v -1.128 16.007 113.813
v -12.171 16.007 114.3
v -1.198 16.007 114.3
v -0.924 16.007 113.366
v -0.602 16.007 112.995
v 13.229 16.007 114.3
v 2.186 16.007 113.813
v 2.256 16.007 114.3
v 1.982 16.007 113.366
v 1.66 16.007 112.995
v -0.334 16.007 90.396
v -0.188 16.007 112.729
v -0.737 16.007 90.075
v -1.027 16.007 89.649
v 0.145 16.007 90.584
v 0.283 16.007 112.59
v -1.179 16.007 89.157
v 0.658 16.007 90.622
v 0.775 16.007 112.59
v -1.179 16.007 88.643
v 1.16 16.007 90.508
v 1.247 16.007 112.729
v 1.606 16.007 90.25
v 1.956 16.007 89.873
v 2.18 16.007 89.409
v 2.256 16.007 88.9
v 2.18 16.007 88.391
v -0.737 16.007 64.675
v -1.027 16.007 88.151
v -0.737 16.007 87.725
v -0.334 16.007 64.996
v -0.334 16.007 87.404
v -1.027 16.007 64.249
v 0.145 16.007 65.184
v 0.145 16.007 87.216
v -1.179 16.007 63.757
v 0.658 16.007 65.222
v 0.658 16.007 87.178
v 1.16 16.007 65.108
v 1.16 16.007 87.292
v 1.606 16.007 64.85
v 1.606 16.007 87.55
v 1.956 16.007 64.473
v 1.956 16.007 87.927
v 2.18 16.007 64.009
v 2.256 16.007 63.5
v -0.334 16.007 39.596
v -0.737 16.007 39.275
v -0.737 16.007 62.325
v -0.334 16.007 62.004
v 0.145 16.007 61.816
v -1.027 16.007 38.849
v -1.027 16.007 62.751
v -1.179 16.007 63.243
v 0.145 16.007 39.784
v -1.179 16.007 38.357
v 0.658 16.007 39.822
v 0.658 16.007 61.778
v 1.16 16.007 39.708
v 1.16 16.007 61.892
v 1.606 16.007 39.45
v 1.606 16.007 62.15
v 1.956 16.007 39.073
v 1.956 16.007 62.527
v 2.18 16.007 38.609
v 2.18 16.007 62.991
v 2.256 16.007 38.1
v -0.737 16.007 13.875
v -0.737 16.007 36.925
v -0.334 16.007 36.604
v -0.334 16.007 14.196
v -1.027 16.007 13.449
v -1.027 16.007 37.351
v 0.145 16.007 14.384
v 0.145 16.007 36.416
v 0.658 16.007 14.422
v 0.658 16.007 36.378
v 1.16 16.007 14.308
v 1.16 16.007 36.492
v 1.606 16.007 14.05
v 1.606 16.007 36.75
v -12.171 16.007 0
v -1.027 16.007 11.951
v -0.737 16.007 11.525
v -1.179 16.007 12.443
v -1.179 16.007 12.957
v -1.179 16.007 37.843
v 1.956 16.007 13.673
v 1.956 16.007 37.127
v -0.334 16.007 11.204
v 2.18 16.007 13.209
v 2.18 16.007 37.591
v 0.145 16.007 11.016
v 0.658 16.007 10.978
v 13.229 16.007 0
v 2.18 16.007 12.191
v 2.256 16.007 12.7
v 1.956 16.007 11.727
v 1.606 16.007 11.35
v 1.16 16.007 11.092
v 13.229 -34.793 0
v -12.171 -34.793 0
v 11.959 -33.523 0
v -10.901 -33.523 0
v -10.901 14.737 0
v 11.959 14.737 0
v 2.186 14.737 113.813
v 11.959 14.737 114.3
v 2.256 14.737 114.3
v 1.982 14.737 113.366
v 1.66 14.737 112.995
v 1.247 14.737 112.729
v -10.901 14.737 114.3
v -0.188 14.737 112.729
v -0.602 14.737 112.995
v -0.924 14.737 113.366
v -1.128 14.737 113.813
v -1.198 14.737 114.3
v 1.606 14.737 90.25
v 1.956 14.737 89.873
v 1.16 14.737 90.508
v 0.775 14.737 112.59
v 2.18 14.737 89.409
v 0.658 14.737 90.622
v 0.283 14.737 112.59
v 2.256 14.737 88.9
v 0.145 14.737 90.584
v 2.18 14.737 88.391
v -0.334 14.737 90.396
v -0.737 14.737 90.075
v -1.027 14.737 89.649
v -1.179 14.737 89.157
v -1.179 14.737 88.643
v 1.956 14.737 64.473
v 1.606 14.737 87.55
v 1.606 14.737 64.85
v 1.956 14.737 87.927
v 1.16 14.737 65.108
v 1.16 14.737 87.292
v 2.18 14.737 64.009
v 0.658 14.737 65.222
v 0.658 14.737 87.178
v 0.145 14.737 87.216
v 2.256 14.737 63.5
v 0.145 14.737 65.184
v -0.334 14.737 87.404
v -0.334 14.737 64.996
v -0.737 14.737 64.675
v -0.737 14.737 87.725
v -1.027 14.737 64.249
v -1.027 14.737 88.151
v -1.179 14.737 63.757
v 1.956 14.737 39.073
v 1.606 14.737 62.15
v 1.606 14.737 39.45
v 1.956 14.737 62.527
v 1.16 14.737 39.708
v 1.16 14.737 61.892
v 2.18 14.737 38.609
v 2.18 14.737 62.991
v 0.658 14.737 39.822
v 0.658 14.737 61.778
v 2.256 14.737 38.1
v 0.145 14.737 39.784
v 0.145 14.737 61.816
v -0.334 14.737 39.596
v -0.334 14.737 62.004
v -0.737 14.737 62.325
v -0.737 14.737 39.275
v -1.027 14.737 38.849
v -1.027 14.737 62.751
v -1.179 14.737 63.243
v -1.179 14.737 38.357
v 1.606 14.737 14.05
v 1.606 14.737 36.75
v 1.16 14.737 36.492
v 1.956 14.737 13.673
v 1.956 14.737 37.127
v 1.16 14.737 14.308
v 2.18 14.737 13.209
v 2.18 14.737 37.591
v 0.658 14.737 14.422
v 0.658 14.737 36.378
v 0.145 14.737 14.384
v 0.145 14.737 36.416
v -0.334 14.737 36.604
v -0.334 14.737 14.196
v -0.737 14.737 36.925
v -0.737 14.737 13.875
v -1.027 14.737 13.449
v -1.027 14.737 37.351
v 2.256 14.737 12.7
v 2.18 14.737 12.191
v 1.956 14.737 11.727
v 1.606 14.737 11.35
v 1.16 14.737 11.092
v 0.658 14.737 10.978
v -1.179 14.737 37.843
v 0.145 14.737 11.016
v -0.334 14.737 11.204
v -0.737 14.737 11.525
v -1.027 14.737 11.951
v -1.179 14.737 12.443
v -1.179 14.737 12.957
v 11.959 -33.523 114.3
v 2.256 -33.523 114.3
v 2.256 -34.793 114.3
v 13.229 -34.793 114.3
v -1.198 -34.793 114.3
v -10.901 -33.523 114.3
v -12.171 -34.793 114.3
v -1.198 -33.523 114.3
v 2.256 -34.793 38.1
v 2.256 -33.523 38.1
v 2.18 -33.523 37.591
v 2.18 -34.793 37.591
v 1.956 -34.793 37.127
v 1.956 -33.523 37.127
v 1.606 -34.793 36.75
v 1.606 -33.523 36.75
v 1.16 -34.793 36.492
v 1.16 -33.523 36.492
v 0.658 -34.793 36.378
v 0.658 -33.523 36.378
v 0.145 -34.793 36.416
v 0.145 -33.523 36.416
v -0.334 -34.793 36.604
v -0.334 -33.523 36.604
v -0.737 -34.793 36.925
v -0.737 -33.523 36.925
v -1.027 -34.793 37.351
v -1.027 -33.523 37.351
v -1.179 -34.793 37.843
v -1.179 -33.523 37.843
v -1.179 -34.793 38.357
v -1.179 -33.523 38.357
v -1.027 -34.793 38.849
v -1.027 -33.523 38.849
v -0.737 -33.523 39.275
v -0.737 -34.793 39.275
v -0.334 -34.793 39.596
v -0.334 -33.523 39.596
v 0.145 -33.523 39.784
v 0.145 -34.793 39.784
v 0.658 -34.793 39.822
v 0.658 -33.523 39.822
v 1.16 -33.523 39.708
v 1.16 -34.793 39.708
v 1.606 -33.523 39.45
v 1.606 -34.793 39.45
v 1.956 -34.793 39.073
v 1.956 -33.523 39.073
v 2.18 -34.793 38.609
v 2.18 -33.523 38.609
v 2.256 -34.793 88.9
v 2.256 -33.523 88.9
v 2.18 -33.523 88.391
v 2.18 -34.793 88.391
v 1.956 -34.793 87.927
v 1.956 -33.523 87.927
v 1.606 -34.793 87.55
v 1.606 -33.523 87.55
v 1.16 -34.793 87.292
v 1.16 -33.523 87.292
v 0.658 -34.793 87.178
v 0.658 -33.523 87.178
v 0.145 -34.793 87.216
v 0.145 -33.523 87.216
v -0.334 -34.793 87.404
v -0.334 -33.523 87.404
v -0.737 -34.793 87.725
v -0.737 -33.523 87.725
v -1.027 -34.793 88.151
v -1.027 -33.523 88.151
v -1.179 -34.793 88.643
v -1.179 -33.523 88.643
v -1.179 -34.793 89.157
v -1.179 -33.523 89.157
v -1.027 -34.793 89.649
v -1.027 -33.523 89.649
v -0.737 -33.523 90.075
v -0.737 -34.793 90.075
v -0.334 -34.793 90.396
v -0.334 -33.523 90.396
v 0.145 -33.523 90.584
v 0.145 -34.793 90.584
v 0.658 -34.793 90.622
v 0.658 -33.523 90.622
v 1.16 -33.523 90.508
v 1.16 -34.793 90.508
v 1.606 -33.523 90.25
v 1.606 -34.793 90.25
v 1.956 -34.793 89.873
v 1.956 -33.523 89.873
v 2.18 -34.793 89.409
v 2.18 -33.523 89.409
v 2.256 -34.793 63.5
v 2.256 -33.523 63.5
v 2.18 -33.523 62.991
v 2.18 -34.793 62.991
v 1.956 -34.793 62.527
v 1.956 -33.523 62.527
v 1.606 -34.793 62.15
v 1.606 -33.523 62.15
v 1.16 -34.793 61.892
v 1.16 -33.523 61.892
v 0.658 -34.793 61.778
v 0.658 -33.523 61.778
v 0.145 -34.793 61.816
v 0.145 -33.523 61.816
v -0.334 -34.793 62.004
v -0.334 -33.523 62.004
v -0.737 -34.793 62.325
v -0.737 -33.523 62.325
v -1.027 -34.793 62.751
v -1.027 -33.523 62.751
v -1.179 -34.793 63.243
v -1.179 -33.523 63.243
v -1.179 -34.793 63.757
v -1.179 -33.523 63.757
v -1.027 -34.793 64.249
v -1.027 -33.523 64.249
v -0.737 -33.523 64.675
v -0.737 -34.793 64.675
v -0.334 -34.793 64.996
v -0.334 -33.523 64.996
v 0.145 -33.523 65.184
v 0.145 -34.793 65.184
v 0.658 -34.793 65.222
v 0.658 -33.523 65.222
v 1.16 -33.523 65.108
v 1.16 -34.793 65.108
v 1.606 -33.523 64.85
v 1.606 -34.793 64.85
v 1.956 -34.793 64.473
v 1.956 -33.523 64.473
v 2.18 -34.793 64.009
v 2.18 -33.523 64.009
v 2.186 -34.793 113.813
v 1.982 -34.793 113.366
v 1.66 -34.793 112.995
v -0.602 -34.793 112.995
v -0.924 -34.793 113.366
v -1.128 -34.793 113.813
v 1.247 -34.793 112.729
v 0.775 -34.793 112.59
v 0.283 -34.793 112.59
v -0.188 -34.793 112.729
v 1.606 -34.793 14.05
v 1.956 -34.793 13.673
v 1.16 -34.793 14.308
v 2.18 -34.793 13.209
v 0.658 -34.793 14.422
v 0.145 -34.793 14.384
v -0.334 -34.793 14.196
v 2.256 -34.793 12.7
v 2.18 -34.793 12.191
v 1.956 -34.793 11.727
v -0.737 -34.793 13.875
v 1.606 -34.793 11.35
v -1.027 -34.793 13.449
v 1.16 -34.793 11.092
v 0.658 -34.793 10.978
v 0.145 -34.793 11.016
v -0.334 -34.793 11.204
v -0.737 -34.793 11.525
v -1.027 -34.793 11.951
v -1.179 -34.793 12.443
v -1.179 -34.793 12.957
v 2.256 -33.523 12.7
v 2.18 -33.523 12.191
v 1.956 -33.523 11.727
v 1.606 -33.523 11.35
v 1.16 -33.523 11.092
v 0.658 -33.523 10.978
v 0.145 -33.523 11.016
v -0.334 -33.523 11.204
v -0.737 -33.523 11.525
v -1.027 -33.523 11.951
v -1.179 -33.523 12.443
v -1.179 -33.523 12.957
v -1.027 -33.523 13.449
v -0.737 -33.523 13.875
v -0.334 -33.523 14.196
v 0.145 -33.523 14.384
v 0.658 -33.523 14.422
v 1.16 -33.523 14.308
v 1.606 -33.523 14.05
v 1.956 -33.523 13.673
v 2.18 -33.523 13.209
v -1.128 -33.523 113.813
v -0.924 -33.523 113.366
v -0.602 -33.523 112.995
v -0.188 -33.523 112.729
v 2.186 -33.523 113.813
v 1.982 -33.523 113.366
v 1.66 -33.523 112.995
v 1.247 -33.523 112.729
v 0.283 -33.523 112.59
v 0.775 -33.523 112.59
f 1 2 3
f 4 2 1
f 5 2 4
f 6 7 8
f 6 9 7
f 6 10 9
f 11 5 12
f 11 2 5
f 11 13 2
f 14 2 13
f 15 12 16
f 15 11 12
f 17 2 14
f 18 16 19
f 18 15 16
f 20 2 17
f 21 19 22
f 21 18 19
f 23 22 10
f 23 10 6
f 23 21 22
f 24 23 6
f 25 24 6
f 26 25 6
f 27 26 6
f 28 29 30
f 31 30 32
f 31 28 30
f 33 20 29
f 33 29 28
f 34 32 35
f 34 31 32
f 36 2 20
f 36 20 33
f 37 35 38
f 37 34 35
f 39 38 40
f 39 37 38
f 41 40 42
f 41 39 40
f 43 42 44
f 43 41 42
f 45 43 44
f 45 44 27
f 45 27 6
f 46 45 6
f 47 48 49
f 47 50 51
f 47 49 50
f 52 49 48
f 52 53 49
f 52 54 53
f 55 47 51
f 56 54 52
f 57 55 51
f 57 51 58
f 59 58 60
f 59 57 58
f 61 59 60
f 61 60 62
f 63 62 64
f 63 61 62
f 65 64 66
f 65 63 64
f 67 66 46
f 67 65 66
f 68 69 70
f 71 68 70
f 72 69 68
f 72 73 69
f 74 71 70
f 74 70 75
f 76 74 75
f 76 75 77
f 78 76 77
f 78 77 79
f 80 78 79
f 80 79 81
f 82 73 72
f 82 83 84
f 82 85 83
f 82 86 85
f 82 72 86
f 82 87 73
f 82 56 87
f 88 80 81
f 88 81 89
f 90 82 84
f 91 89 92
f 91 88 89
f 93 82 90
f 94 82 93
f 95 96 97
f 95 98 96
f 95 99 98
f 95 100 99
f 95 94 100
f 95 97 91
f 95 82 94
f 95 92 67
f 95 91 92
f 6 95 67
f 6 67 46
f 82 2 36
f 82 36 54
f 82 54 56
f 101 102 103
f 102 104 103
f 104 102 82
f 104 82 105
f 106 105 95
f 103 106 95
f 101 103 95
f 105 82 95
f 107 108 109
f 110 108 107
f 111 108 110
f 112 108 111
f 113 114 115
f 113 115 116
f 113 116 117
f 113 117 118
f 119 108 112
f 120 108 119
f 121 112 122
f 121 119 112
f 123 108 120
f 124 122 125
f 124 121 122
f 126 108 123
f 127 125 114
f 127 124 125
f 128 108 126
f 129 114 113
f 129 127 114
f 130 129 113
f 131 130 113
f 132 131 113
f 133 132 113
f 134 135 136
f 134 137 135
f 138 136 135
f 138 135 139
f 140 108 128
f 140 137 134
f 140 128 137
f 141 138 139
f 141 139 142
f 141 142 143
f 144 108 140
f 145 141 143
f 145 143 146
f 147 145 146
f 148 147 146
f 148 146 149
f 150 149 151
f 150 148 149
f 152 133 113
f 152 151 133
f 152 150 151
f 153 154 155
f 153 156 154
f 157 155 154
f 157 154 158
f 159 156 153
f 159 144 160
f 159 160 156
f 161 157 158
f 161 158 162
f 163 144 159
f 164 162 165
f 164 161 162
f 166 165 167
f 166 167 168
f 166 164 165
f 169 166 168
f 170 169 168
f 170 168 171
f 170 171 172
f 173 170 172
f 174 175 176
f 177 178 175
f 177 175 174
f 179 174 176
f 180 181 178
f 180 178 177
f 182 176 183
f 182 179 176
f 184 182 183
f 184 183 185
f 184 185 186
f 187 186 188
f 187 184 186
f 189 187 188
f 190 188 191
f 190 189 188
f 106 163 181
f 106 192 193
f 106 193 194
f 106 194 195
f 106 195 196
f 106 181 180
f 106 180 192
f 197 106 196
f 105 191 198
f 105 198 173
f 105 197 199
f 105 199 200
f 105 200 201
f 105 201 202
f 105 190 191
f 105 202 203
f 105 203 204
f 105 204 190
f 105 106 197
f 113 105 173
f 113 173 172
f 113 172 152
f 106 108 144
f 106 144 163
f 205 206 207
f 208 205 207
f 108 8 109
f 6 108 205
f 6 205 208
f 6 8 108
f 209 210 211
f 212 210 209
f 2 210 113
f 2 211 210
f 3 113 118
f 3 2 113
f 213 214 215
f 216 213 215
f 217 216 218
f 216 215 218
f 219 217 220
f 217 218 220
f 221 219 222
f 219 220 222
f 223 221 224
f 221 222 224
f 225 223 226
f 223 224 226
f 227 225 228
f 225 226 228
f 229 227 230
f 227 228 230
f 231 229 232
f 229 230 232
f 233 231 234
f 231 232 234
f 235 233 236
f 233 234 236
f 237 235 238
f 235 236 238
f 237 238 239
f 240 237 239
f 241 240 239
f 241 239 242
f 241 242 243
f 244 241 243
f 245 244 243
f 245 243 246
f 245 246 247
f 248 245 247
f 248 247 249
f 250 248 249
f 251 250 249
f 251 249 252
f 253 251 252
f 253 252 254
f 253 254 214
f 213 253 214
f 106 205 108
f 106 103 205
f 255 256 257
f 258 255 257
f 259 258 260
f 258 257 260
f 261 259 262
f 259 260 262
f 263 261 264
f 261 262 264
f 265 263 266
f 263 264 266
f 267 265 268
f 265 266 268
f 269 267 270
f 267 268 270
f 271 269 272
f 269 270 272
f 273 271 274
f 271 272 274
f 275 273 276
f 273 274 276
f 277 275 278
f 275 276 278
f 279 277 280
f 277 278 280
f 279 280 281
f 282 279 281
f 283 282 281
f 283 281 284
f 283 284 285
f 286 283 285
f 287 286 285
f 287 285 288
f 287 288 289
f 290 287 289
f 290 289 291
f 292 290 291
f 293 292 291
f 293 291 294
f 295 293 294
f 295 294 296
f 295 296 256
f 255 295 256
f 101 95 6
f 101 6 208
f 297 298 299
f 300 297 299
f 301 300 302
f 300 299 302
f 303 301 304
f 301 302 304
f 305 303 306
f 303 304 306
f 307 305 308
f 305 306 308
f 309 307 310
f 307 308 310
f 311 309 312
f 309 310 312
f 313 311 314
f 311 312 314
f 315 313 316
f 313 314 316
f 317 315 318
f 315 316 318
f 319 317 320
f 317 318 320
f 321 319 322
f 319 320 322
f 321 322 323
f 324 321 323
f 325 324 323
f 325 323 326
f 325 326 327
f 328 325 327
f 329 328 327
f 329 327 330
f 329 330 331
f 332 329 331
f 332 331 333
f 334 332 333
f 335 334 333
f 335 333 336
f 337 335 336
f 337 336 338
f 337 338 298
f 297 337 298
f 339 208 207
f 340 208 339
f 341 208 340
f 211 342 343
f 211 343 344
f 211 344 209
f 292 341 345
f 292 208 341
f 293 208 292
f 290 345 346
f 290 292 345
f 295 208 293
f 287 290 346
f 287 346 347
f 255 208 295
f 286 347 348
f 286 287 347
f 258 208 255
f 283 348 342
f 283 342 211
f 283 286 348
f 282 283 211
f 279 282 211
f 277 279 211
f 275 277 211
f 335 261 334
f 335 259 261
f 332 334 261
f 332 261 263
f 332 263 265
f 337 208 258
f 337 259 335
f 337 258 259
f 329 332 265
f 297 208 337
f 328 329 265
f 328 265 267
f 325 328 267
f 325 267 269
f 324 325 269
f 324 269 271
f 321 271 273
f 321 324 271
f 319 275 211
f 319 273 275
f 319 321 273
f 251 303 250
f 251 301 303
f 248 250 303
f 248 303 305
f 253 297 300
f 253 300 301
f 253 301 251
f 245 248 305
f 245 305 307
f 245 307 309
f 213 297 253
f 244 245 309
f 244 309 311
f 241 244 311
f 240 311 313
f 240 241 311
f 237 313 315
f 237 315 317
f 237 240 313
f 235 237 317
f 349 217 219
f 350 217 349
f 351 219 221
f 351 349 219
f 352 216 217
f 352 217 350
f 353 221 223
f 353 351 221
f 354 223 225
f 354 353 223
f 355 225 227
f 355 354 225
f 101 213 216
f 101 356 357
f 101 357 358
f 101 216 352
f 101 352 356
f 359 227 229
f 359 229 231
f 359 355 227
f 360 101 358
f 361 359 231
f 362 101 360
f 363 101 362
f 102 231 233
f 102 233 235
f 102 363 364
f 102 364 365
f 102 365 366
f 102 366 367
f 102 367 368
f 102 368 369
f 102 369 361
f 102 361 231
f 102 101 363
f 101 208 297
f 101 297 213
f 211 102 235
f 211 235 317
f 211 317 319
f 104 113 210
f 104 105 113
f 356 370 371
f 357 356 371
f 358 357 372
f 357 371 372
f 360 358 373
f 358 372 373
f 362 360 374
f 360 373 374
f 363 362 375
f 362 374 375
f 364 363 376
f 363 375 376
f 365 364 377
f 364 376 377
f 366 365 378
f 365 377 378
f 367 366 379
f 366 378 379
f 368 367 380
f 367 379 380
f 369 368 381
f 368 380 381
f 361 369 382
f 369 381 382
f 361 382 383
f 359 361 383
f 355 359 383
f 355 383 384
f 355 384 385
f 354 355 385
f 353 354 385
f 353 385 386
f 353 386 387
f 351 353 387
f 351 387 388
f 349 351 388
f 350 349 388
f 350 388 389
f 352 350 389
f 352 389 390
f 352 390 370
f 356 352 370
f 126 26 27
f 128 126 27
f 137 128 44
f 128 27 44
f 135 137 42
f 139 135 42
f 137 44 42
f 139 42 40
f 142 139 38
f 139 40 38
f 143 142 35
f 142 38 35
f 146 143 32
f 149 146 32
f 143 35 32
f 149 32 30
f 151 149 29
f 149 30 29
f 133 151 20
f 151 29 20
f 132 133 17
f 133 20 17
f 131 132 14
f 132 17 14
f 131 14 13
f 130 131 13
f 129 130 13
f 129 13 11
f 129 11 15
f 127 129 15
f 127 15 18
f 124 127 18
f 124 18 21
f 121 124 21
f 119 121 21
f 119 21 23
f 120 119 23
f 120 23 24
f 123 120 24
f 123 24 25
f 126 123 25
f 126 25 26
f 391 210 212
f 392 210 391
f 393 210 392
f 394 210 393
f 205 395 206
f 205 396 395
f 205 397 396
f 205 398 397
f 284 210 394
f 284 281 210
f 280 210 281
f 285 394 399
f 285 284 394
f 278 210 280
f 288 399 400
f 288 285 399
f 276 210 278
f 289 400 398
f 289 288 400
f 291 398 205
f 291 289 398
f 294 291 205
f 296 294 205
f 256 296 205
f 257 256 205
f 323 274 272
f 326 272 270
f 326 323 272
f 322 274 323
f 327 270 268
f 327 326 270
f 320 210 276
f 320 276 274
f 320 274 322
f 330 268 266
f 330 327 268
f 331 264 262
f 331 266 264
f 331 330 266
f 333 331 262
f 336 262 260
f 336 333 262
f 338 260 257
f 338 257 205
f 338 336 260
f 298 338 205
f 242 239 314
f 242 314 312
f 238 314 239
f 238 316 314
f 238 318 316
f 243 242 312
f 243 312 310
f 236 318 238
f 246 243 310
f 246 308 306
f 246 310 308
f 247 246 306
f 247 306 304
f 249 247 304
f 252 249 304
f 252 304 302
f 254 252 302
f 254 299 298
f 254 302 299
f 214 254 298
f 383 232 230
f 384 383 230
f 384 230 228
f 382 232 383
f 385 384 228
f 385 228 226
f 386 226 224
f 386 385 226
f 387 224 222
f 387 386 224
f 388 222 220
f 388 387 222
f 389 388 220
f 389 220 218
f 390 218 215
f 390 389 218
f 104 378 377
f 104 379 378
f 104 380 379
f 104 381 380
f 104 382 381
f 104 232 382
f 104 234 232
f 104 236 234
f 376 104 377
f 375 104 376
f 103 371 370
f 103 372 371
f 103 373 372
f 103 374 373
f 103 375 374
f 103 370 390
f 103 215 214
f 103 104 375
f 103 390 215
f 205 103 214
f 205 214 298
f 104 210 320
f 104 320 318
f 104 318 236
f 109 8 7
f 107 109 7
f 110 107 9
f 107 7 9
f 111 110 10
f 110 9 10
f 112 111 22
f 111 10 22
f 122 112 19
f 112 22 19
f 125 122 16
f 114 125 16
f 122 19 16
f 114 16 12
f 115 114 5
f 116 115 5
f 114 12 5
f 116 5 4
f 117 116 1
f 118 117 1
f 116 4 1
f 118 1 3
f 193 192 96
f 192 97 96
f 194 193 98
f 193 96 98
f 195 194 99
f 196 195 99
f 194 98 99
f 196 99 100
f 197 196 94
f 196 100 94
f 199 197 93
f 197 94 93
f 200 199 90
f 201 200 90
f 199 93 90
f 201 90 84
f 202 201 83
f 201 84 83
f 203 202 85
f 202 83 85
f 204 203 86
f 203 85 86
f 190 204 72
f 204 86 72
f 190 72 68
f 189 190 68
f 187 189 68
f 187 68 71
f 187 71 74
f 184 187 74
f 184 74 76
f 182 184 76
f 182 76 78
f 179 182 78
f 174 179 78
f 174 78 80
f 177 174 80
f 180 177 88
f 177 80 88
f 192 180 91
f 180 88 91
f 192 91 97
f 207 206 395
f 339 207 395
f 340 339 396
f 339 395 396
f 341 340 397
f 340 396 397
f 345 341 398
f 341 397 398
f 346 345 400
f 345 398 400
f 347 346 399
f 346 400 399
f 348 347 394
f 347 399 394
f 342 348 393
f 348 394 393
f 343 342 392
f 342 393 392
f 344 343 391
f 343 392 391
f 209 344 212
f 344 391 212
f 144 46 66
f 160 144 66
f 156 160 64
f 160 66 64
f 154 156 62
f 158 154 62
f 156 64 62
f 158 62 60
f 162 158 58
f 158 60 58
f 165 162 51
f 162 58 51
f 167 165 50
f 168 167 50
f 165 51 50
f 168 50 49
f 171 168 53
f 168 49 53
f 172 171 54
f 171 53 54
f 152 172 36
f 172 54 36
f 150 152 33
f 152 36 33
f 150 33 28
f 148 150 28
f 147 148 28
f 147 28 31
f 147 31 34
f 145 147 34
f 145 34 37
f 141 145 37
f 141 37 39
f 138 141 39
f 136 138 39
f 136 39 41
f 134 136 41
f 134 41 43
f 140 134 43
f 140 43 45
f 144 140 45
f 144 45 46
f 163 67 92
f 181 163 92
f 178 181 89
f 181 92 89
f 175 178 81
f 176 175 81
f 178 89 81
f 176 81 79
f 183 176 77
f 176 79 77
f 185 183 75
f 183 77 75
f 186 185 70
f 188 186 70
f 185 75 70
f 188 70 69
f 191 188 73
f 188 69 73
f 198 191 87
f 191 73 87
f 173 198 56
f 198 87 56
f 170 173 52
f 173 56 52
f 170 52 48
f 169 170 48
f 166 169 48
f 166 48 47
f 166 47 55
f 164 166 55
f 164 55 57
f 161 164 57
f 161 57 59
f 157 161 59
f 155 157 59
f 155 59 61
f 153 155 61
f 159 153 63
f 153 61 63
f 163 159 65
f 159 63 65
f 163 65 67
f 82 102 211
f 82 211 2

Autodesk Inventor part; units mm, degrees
ref_plane "YZ Plane" through (0, 0, 0) normal (1, 0, 0) x (0, 1, 0)
ref_plane "XZ Plane" through (0, 0, 0) normal (0, 1, 0) x (-1, 0, 0)
ref_plane "XY Plane" through (0, 0, 0) normal (0, 0, 1) x (1, 0, 0)
sketch "Sketch1" plane through (0, 0, 0) normal (0, 0, 1) x (1, 0, 0)
  line L0 (-12.1708, 16.0073) -> (13.2292, 16.0073)
  line L1 (13.2292, 16.0073) -> (13.2292, -34.7927)
  line L2 (13.2292, -34.7927) -> (-12.1708, -34.7927)
  line L3 (-12.1708, -34.7927) -> (-12.1708, 16.0073)
  line L4 (11.9592, 14.7373) -> (-10.9008, 14.7373)
  line L5 (-10.9008, 14.7373) -> (-10.9008, -33.5227)
  line L6 (-10.9008, -33.5227) -> (11.9592, -33.5227)
  line L7 (11.9592, -33.5227) -> (11.9592, 14.7373)
  point P0 (0, 0)
  dimension "d0" = 25.4
  dimension "d1" = 50.8
  dimension "d2" = 1.27
extrude "Extrusion1" add sketch "Sketch1" along normal blind 114.3
sketch "Sketch2" plane through (-12.1708, 16.0073, 0) normal (0, 1, 0) x (1, 0, 0)
  circle A0 centre (12.7, -12.7) radius 1.7272
  line L0 (25.4, 0) -> (0, 0) projected
  line L1 (0, 0) -> (0, -114.3) projected
  point P0 (12.1708, 0)
  dimension "d5" = 3.4544
  dimension "d6" = 12.7
  dimension "d7" = 12.7
extrude "Extrusion2" cut sketch "Sketch2" against normal through all
pattern_linear "Rectangular Pattern1" count 11 spacing 25.4 along (0, 0, 1) of "Extrusion2"
equation "\"d3\" = d13"
equation "\"d10\" = d14"
equation "\"d13\" = 114.3"
equation "\"d14\" = d13"
properties part number "VersaFrame (Gripper-MovingLong)"
